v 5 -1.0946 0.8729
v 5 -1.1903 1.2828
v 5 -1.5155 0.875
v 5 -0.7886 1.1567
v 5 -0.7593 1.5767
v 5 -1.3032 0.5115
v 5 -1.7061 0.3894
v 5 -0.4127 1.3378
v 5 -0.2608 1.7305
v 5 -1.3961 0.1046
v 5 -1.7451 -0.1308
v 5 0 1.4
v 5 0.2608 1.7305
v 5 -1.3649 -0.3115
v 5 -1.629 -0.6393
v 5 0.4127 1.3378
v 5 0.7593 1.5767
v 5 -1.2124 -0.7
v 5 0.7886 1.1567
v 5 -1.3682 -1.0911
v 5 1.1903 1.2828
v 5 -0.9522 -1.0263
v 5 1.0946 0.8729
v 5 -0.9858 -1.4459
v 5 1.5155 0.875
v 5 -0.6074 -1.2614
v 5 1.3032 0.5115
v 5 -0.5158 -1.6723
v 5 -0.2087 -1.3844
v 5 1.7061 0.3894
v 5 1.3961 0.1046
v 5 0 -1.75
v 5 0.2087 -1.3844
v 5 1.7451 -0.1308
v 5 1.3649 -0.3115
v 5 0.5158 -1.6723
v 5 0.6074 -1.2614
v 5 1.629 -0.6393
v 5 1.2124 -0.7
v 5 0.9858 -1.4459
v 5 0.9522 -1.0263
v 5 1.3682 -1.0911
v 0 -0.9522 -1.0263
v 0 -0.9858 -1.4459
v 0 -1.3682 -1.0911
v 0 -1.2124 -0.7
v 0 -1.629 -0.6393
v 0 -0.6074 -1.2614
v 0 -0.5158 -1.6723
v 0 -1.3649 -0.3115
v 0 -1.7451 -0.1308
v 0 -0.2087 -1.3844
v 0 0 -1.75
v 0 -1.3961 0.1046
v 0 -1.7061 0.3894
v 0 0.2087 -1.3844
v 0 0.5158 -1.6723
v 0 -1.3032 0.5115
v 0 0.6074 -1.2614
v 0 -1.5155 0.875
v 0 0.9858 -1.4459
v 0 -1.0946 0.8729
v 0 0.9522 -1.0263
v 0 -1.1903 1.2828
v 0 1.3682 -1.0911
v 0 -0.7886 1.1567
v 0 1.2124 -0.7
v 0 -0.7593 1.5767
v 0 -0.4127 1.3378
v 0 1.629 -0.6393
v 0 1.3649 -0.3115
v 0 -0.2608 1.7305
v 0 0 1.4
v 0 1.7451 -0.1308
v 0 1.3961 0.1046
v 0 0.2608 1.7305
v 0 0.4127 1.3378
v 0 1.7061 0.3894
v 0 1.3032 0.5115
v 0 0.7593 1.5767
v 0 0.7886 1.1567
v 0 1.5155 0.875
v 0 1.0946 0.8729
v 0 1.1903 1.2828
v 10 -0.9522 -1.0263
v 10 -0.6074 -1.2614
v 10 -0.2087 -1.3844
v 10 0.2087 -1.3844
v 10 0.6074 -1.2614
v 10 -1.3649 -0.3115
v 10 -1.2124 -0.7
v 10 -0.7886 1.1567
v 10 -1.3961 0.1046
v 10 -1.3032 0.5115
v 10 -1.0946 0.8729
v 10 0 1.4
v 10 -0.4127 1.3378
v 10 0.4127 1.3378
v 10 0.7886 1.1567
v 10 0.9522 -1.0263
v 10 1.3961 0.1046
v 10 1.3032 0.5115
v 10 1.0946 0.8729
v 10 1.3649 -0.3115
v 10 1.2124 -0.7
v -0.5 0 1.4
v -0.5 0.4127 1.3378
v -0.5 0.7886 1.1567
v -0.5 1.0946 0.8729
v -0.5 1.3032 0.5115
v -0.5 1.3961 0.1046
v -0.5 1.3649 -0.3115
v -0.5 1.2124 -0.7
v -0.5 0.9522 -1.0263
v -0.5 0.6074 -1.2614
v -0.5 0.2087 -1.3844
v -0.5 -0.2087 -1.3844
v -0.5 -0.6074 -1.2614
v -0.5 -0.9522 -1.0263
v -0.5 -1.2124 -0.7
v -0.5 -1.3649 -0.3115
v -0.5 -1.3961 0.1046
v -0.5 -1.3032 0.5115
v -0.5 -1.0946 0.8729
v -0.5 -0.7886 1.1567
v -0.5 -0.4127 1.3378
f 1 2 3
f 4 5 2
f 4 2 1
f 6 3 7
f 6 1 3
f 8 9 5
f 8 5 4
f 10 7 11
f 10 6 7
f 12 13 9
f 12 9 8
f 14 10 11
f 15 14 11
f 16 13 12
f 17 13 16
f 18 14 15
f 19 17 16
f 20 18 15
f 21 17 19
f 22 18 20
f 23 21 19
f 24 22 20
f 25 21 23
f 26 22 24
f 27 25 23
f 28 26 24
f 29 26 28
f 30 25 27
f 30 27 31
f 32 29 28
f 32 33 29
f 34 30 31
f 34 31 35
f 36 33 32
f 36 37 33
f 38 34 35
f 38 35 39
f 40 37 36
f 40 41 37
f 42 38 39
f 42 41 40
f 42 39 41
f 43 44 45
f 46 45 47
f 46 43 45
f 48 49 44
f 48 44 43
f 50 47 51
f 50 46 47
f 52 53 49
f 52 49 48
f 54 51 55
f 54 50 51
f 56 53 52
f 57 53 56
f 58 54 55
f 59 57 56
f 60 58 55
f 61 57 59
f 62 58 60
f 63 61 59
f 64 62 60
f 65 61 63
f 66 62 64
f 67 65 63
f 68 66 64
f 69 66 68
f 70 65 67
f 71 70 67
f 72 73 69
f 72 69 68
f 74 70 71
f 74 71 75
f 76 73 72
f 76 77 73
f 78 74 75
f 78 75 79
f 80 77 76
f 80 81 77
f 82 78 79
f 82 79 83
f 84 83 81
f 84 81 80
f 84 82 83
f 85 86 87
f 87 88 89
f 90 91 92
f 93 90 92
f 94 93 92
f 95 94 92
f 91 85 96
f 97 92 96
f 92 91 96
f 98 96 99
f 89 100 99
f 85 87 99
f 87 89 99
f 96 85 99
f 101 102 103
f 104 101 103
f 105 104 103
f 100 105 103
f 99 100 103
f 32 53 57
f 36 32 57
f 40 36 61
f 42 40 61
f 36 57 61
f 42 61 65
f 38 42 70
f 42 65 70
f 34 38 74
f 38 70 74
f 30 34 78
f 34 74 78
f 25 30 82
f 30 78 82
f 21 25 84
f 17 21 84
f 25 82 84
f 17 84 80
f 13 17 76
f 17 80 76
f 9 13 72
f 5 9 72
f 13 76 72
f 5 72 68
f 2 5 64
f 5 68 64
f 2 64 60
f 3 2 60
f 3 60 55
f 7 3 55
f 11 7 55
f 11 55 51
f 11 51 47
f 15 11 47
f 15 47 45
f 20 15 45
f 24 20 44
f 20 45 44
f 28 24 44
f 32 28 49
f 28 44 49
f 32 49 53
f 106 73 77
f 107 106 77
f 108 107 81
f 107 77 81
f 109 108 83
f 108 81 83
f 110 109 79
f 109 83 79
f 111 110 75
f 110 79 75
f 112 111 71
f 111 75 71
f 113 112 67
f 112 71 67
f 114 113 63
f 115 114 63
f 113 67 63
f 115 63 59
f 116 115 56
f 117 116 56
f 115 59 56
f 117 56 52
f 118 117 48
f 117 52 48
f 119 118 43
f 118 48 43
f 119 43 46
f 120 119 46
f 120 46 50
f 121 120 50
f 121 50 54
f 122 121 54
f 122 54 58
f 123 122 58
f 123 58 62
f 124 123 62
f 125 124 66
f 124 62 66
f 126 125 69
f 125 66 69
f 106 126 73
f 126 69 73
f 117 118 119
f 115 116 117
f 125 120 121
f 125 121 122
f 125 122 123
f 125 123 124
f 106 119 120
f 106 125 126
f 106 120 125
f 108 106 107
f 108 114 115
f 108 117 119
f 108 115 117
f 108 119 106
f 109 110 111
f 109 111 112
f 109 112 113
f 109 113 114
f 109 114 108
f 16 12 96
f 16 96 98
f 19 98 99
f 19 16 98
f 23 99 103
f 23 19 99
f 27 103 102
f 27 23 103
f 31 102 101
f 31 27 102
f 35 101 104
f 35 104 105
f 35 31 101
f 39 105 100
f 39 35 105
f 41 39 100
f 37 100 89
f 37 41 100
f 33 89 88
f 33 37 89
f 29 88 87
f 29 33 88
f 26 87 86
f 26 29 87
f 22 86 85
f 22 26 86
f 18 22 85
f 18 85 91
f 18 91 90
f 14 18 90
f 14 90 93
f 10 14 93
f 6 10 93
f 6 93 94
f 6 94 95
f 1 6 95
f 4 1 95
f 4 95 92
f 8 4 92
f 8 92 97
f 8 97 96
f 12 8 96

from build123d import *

# Parameters (mm, degrees)
SKETCH1_R           = 1.75
BOSS_EXTRUDE1_DEPTH = 5
SKETCH2_R           = 1.4
BOSS_EXTRUDE2_DEPTH = 10
BOSS_EXTRUDE3_START = 0.5
SKETCH2_2_R         = 1.4
BOSS_EXTRUDE3_DEPTH = 0.5


with BuildPart() as part:
    # Sketch1 → Boss-Extrude1 (new body)
    with BuildSketch(Plane(origin=(0, 0, 0), x_dir=(0, 0, -1), z_dir=(1, 0, 0))):
        Circle(SKETCH1_R)
    extrude(amount=BOSS_EXTRUDE1_DEPTH)

    # Sketch2 → Boss-Extrude2 (add)
    with BuildSketch(Plane.ZY):
        Circle(SKETCH2_R)
    extrude(amount=-BOSS_EXTRUDE2_DEPTH)

    # Sketch2<2> → Boss-Extrude3 (add)
    with BuildSketch(Plane.ZY.offset(BOSS_EXTRUDE3_START)):
        Circle(SKETCH2_2_R)
    extrude(amount=-BOSS_EXTRUDE3_DEPTH)


solid = part.part
